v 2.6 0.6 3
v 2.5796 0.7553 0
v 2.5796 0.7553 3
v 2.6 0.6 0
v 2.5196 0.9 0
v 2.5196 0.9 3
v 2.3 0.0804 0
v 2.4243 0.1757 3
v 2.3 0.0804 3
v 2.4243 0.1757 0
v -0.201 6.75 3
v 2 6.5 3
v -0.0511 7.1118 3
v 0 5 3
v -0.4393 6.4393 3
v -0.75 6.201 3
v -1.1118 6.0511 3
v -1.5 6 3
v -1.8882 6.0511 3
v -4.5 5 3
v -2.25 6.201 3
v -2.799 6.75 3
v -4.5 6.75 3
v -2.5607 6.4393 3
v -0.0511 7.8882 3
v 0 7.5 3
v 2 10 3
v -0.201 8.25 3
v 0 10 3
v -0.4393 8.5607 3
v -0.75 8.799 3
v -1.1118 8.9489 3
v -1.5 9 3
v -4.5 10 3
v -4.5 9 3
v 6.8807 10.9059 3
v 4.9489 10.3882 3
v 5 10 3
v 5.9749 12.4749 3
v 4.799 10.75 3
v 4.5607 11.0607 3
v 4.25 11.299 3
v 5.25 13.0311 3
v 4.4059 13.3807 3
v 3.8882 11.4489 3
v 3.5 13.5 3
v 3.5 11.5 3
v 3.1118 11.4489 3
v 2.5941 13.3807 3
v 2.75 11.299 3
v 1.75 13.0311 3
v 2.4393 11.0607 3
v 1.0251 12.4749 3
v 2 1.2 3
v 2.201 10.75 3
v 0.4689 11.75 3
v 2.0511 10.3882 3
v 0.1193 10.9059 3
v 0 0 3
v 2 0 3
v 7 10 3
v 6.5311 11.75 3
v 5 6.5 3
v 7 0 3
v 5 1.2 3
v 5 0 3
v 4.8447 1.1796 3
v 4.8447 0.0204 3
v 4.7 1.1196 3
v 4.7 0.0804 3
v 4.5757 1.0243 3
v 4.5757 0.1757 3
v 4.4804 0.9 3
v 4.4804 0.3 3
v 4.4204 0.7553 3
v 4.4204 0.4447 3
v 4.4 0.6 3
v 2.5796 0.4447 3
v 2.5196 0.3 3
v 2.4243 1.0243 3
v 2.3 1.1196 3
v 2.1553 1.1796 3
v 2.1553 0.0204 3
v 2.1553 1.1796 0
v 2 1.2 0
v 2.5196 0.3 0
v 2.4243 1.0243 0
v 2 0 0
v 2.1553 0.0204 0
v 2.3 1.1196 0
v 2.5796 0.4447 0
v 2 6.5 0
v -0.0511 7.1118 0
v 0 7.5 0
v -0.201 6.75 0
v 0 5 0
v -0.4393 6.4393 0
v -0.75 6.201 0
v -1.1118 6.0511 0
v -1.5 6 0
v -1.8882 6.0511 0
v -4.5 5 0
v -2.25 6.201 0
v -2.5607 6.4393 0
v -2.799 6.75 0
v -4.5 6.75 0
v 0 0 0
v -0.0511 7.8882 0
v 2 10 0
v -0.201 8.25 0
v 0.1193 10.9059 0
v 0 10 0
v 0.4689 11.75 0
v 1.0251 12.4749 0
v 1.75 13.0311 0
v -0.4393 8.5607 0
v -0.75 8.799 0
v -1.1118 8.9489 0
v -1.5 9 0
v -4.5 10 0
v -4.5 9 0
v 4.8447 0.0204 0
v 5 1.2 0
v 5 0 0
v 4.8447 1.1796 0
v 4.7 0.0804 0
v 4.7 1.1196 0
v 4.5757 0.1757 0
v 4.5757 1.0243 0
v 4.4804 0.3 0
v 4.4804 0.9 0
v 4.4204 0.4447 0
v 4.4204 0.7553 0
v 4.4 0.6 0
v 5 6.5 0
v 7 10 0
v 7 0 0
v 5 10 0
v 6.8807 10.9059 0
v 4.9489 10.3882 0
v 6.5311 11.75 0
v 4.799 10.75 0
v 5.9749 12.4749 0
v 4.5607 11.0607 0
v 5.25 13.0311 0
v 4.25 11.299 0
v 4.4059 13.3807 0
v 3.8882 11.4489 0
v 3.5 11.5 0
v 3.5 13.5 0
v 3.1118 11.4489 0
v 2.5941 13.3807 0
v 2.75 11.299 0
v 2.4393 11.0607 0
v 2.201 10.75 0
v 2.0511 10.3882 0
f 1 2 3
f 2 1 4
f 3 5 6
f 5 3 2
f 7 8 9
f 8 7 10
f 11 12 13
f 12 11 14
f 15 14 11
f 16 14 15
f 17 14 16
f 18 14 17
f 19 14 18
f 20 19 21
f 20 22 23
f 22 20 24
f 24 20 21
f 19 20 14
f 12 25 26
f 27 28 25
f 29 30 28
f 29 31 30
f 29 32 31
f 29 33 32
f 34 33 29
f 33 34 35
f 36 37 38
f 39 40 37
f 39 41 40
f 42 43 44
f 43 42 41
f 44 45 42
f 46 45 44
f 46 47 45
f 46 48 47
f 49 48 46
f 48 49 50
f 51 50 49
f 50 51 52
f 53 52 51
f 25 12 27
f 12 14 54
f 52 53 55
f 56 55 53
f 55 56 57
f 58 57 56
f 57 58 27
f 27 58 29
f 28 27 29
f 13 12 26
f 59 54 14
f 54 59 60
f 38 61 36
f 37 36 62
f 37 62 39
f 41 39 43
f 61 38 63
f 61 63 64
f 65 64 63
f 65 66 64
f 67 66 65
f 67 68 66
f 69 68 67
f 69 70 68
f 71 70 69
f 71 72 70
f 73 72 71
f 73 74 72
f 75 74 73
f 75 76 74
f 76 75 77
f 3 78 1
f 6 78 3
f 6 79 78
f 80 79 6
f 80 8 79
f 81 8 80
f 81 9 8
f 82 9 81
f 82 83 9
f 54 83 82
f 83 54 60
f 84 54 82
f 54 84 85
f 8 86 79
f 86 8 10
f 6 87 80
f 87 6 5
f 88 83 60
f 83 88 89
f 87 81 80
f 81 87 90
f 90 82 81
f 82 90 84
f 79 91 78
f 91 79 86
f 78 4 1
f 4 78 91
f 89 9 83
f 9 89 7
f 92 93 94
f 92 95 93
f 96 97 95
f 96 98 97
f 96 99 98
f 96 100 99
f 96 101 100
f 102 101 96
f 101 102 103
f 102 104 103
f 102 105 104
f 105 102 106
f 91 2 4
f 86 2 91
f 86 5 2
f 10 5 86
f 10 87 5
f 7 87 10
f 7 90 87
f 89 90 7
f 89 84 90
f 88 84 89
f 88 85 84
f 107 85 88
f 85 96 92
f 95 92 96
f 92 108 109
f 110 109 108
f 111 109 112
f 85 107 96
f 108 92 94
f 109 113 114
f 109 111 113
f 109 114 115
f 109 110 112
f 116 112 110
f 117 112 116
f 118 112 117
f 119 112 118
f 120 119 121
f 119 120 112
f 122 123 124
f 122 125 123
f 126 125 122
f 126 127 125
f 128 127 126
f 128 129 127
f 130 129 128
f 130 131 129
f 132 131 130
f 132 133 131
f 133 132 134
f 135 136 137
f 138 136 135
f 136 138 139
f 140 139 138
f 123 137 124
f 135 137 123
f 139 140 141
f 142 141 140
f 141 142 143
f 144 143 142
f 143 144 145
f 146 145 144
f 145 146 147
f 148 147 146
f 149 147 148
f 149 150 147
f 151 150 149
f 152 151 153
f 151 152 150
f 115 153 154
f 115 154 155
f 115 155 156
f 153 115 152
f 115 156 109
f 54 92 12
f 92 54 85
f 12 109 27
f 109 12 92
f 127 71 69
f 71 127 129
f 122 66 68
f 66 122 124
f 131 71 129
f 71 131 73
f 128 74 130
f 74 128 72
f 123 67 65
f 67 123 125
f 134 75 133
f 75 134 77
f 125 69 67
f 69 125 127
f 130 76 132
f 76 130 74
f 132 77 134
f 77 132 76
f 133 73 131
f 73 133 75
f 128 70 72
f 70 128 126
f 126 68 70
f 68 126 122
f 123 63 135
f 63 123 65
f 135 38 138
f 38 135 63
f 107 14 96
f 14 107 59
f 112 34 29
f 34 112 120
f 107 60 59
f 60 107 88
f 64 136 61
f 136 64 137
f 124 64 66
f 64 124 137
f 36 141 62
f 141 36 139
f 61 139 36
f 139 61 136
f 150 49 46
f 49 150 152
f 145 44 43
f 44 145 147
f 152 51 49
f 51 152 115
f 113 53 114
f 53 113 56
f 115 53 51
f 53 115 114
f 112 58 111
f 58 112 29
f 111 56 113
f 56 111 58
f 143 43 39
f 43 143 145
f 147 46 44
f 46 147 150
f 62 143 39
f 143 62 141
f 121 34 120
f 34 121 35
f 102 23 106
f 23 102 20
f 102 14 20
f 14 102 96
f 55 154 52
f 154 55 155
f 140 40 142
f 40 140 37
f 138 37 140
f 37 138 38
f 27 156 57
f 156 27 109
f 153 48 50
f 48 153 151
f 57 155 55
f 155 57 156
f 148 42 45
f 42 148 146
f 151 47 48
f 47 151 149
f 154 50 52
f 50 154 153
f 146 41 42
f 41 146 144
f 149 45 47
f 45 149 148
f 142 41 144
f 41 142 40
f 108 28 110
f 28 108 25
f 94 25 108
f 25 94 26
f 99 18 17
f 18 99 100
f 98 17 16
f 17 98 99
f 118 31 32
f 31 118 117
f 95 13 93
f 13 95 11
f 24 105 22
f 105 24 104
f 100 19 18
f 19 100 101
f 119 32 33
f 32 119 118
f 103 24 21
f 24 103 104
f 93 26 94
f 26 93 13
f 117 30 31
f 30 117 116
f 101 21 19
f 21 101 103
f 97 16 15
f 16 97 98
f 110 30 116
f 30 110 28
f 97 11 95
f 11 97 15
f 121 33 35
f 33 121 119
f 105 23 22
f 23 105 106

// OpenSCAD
// [FL_INDEX: keywords="openscad, 3d_parametric, The_Duck_Clip, csg_solid" | COT="Parametric OpenSCAD design from 3DCodeverse"]
// Title: The Duck Clip

//Customizable Filament Clip by Dealmann


//Diameter of your filament.
fc_filament=3;

//Thickness of your spool.
fc_spool=2;

//In case your spool has a rim.
fc_rim=0;

//Length of the clips "arms".
fc_length=10;

//Width of the clip.
fc_width=3;

//Thickness of the clip.
fc_thickness=2;





difference()
	{
		union()
			{
				cube([fc_thickness, fc_length, fc_width]);

				translate([fc_thickness+fc_rim+fc_spool+1, 0, 0])
				cube([fc_thickness, fc_length, fc_width]);

				translate([fc_thickness+(fc_rim+fc_spool+1)/2, fc_length,0])
				cylinder(r=fc_thickness+(fc_rim+fc_spool+1)/2, h=fc_width, $fn=24);

				difference()
					{
						translate([fc_thickness,0.5+fc_rim/2+fc_spool*0.05,0])
						cylinder(r=0.5+fc_rim/2+fc_spool*0.05,h=fc_width, $fn=24);

						translate([fc_thickness-(0.5+fc_rim/2+fc_spool*0.05+1),0,-1])
						cube([0.5+fc_rim/2+fc_spool*0.05+1,(0.5+fc_rim/2+fc_spool*0.05)*2,fc_width+2]);
					}
				
				difference()
					{
						translate([fc_thickness+fc_rim+fc_spool+1,0.5+fc_rim/2+fc_spool*0.05,0])
						cylinder(r=0.5+fc_rim/2+fc_spool*0.05,h=fc_width, $fn=24);

						translate([fc_thickness+fc_rim+fc_spool+1,0,-1])
						cube([0.5+fc_rim/2+fc_spool*0.05+1,(0.5+fc_rim/2+fc_spool*0.05)*2,fc_width+2]);
				
					}

				translate([-fc_filament*1.5,fc_length-(fc_filament+2),0])
				cube([fc_filament*1.5,fc_filament+2,fc_width]);

			}
		translate([fc_thickness+(fc_rim+fc_spool+1)/2, fc_length,-1])
		cylinder(r=(fc_rim+fc_spool+1)/2, h=fc_width+2, $fn=24);

		translate([fc_thickness,fc_length-(fc_thickness+(fc_rim+fc_spool+1)/2),-1])
		cube([fc_rim+fc_spool+1, fc_thickness+(fc_rim+fc_spool+1)/2, fc_width+2]);

		translate([-fc_filament/2,fc_length-fc_filament/2-1,-1])
		cylinder(r=fc_filament/2, h=fc_width+2, $fn=24);

		translate([-fc_filament*1.5-1,fc_length-fc_filament*0.75-1,-1])
		cube([fc_filament+1,fc_filament*0.75,fc_width+2]);
	}
